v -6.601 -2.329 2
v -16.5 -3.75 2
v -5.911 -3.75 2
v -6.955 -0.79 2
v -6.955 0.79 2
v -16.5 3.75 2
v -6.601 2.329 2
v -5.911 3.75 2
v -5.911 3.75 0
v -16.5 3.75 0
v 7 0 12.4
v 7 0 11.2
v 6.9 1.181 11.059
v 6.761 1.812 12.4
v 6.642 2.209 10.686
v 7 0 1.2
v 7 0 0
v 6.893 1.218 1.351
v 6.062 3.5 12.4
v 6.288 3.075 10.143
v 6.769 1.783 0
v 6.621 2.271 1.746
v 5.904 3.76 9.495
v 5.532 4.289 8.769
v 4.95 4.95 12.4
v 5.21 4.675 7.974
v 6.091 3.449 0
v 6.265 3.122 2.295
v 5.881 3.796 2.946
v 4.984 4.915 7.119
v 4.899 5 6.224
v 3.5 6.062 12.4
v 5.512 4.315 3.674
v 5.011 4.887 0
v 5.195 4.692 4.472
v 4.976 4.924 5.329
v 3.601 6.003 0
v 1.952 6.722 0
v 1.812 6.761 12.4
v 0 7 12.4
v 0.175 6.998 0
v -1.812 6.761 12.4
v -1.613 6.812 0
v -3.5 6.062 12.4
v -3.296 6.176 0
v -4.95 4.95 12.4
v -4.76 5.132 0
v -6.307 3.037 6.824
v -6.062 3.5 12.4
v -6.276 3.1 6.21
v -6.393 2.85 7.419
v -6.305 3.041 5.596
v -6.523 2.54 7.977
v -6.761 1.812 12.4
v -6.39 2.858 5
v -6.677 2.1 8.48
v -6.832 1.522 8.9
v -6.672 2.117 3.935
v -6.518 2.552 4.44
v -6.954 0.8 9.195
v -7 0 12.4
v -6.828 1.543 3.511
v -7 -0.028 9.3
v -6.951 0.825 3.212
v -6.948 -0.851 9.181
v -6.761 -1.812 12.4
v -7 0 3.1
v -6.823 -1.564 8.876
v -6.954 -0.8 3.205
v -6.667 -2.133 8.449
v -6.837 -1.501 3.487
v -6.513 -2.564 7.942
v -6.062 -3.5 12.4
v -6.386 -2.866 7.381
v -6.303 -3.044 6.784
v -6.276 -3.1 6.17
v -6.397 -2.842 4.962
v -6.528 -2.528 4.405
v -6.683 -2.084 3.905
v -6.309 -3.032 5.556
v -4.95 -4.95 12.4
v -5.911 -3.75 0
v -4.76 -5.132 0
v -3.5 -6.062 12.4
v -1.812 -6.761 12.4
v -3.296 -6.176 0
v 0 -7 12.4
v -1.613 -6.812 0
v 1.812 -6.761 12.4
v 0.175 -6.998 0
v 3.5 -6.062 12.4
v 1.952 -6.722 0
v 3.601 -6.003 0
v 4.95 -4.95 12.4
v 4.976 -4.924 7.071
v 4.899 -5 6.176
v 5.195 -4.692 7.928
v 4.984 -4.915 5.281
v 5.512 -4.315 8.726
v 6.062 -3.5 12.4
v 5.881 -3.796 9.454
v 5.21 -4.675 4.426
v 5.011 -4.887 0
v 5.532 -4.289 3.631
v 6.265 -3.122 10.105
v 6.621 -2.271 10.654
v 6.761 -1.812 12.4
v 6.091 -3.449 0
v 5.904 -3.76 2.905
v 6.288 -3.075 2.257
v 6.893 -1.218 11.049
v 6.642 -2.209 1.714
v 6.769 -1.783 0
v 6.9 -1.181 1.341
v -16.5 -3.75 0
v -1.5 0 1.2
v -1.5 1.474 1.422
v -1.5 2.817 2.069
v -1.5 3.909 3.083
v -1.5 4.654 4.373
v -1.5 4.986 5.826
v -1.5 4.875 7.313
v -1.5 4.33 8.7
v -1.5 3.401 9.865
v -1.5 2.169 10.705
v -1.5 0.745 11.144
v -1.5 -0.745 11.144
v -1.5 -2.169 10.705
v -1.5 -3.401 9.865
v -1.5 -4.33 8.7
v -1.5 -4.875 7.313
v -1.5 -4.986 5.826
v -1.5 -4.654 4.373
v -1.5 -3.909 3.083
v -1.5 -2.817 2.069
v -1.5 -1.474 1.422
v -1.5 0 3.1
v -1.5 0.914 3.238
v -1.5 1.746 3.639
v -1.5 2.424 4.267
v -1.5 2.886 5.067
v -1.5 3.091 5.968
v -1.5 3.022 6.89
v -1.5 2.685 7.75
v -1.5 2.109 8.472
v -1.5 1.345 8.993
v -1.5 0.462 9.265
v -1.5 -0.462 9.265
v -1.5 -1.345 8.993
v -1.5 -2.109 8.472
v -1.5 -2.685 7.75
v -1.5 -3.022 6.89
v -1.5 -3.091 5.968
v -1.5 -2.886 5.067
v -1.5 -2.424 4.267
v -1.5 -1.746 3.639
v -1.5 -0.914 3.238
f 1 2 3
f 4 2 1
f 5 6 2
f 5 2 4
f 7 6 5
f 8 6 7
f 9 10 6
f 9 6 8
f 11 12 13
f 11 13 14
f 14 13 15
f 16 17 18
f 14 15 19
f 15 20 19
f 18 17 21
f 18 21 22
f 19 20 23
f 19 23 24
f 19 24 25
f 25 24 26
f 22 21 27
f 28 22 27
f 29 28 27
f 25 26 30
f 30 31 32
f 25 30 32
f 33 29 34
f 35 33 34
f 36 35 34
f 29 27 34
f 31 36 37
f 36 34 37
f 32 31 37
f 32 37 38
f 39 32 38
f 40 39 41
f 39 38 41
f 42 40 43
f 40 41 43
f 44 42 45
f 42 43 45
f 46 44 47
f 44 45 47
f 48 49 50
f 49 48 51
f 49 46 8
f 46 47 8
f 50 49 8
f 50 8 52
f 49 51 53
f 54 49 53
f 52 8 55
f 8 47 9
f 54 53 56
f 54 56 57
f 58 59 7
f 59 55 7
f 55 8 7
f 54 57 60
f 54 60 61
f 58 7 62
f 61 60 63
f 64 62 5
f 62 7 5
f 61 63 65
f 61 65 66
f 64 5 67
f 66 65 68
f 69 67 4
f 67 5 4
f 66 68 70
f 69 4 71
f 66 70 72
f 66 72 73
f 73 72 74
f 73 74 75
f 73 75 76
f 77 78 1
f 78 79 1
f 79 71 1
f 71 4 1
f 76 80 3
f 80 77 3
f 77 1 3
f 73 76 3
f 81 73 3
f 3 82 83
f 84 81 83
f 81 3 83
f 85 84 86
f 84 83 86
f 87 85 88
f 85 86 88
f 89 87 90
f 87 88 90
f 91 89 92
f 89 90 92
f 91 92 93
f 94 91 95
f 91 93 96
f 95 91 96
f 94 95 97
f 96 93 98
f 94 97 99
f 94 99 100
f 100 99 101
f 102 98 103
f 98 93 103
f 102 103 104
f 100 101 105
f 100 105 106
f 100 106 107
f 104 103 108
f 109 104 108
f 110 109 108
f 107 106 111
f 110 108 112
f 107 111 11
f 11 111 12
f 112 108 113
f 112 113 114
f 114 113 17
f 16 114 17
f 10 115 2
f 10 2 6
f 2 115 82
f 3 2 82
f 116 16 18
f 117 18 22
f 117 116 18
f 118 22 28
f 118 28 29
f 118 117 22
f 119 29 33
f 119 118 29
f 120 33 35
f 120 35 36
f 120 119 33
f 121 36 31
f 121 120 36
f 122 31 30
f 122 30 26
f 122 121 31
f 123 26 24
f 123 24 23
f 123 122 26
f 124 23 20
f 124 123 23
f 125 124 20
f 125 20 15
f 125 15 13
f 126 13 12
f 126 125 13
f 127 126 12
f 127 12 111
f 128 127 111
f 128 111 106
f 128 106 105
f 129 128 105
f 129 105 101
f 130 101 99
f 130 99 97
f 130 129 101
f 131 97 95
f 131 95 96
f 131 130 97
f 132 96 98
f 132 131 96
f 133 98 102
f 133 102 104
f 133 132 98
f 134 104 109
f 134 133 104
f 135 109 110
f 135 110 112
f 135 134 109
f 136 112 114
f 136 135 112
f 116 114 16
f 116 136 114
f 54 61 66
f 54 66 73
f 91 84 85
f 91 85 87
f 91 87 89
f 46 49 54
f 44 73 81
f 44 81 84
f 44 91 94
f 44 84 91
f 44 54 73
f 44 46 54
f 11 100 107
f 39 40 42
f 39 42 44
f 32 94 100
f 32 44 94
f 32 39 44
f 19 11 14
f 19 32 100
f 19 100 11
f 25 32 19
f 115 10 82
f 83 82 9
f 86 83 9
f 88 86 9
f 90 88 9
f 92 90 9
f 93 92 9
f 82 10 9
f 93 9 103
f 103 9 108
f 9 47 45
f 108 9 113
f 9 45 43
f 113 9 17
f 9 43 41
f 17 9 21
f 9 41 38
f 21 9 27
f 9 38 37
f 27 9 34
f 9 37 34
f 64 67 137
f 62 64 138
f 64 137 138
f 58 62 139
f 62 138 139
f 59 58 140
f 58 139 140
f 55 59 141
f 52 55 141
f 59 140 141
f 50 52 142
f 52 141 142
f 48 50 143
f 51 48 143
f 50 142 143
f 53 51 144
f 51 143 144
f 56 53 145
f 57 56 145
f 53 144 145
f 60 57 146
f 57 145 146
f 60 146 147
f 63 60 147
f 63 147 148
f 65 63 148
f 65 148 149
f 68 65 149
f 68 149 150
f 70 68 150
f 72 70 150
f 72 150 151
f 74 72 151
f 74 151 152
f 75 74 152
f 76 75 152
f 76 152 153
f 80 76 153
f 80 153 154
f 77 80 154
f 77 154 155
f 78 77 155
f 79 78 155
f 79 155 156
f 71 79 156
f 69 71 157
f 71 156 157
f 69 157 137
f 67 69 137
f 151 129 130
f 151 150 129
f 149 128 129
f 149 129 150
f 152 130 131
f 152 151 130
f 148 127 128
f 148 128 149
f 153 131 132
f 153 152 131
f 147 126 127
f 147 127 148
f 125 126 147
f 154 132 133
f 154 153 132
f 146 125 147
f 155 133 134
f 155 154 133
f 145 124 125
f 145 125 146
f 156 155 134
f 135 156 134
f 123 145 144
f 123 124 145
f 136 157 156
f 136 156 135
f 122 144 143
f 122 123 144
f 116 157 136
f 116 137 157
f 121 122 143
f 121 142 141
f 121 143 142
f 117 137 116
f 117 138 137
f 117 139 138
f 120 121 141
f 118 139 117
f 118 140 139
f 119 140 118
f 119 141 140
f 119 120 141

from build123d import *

# Parameters (mm, degrees)
SKETCH_1_R               = 7
EXTRUDE_1_DEPTH          = 12.4
SKETCH_2_W               = 10.589204791
SKETCH_2_H               = 7.5
EXTRUDE_2_DEPTH          = 2
SKETCH_3_R               = 5
CUT_EXTRUDE_1_DEPTH      = 8
CUT_EXTRUDE_1_DEPTH_BACK = 1.5
SKETCH_4_R               = 3.1
CUT_EXTRUDE_2_DEPTH      = 16


with BuildPart() as part:
    # Эскиз1 → Бобышка-Вытянуть1 (new body)
    with BuildSketch(Plane.XY):
        Circle(SKETCH_1_R)
    extrude(amount=EXTRUDE_1_DEPTH)

    # Эскиз2 → Бобышка-Вытянуть2 (add)
    with BuildSketch(Plane.XY):
        with Locations((-11.205397604, 0)):
            Rectangle(SKETCH_2_W, SKETCH_2_H)
    extrude(amount=EXTRUDE_2_DEPTH)

    # Эскиз3 → Вырез-Вытянуть1 (cut, two sides)
    with BuildSketch(Plane(origin=(0, 0, 0), x_dir=(0, 0, -1), z_dir=(1, 0, 0))) as cut_extrude_1_sk:
        with Locations((-6.2, 0)):
            Circle(SKETCH_3_R)
    extrude(amount=CUT_EXTRUDE_1_DEPTH, mode=Mode.SUBTRACT)
    extrude(cut_extrude_1_sk.sketch, amount=-CUT_EXTRUDE_1_DEPTH_BACK, mode=Mode.SUBTRACT)

    # Эскиз4 → Вырез-Вытянуть2 (cut, through all)
    with BuildSketch(Plane(origin=(-1.5, 0, 0), x_dir=(0, 0, -1), z_dir=(1, 0, 0))):
        with Locations((-6.2, 0)):
            Circle(SKETCH_4_R)
    extrude(amount=-CUT_EXTRUDE_2_DEPTH, mode=Mode.SUBTRACT)


solid = part.part
